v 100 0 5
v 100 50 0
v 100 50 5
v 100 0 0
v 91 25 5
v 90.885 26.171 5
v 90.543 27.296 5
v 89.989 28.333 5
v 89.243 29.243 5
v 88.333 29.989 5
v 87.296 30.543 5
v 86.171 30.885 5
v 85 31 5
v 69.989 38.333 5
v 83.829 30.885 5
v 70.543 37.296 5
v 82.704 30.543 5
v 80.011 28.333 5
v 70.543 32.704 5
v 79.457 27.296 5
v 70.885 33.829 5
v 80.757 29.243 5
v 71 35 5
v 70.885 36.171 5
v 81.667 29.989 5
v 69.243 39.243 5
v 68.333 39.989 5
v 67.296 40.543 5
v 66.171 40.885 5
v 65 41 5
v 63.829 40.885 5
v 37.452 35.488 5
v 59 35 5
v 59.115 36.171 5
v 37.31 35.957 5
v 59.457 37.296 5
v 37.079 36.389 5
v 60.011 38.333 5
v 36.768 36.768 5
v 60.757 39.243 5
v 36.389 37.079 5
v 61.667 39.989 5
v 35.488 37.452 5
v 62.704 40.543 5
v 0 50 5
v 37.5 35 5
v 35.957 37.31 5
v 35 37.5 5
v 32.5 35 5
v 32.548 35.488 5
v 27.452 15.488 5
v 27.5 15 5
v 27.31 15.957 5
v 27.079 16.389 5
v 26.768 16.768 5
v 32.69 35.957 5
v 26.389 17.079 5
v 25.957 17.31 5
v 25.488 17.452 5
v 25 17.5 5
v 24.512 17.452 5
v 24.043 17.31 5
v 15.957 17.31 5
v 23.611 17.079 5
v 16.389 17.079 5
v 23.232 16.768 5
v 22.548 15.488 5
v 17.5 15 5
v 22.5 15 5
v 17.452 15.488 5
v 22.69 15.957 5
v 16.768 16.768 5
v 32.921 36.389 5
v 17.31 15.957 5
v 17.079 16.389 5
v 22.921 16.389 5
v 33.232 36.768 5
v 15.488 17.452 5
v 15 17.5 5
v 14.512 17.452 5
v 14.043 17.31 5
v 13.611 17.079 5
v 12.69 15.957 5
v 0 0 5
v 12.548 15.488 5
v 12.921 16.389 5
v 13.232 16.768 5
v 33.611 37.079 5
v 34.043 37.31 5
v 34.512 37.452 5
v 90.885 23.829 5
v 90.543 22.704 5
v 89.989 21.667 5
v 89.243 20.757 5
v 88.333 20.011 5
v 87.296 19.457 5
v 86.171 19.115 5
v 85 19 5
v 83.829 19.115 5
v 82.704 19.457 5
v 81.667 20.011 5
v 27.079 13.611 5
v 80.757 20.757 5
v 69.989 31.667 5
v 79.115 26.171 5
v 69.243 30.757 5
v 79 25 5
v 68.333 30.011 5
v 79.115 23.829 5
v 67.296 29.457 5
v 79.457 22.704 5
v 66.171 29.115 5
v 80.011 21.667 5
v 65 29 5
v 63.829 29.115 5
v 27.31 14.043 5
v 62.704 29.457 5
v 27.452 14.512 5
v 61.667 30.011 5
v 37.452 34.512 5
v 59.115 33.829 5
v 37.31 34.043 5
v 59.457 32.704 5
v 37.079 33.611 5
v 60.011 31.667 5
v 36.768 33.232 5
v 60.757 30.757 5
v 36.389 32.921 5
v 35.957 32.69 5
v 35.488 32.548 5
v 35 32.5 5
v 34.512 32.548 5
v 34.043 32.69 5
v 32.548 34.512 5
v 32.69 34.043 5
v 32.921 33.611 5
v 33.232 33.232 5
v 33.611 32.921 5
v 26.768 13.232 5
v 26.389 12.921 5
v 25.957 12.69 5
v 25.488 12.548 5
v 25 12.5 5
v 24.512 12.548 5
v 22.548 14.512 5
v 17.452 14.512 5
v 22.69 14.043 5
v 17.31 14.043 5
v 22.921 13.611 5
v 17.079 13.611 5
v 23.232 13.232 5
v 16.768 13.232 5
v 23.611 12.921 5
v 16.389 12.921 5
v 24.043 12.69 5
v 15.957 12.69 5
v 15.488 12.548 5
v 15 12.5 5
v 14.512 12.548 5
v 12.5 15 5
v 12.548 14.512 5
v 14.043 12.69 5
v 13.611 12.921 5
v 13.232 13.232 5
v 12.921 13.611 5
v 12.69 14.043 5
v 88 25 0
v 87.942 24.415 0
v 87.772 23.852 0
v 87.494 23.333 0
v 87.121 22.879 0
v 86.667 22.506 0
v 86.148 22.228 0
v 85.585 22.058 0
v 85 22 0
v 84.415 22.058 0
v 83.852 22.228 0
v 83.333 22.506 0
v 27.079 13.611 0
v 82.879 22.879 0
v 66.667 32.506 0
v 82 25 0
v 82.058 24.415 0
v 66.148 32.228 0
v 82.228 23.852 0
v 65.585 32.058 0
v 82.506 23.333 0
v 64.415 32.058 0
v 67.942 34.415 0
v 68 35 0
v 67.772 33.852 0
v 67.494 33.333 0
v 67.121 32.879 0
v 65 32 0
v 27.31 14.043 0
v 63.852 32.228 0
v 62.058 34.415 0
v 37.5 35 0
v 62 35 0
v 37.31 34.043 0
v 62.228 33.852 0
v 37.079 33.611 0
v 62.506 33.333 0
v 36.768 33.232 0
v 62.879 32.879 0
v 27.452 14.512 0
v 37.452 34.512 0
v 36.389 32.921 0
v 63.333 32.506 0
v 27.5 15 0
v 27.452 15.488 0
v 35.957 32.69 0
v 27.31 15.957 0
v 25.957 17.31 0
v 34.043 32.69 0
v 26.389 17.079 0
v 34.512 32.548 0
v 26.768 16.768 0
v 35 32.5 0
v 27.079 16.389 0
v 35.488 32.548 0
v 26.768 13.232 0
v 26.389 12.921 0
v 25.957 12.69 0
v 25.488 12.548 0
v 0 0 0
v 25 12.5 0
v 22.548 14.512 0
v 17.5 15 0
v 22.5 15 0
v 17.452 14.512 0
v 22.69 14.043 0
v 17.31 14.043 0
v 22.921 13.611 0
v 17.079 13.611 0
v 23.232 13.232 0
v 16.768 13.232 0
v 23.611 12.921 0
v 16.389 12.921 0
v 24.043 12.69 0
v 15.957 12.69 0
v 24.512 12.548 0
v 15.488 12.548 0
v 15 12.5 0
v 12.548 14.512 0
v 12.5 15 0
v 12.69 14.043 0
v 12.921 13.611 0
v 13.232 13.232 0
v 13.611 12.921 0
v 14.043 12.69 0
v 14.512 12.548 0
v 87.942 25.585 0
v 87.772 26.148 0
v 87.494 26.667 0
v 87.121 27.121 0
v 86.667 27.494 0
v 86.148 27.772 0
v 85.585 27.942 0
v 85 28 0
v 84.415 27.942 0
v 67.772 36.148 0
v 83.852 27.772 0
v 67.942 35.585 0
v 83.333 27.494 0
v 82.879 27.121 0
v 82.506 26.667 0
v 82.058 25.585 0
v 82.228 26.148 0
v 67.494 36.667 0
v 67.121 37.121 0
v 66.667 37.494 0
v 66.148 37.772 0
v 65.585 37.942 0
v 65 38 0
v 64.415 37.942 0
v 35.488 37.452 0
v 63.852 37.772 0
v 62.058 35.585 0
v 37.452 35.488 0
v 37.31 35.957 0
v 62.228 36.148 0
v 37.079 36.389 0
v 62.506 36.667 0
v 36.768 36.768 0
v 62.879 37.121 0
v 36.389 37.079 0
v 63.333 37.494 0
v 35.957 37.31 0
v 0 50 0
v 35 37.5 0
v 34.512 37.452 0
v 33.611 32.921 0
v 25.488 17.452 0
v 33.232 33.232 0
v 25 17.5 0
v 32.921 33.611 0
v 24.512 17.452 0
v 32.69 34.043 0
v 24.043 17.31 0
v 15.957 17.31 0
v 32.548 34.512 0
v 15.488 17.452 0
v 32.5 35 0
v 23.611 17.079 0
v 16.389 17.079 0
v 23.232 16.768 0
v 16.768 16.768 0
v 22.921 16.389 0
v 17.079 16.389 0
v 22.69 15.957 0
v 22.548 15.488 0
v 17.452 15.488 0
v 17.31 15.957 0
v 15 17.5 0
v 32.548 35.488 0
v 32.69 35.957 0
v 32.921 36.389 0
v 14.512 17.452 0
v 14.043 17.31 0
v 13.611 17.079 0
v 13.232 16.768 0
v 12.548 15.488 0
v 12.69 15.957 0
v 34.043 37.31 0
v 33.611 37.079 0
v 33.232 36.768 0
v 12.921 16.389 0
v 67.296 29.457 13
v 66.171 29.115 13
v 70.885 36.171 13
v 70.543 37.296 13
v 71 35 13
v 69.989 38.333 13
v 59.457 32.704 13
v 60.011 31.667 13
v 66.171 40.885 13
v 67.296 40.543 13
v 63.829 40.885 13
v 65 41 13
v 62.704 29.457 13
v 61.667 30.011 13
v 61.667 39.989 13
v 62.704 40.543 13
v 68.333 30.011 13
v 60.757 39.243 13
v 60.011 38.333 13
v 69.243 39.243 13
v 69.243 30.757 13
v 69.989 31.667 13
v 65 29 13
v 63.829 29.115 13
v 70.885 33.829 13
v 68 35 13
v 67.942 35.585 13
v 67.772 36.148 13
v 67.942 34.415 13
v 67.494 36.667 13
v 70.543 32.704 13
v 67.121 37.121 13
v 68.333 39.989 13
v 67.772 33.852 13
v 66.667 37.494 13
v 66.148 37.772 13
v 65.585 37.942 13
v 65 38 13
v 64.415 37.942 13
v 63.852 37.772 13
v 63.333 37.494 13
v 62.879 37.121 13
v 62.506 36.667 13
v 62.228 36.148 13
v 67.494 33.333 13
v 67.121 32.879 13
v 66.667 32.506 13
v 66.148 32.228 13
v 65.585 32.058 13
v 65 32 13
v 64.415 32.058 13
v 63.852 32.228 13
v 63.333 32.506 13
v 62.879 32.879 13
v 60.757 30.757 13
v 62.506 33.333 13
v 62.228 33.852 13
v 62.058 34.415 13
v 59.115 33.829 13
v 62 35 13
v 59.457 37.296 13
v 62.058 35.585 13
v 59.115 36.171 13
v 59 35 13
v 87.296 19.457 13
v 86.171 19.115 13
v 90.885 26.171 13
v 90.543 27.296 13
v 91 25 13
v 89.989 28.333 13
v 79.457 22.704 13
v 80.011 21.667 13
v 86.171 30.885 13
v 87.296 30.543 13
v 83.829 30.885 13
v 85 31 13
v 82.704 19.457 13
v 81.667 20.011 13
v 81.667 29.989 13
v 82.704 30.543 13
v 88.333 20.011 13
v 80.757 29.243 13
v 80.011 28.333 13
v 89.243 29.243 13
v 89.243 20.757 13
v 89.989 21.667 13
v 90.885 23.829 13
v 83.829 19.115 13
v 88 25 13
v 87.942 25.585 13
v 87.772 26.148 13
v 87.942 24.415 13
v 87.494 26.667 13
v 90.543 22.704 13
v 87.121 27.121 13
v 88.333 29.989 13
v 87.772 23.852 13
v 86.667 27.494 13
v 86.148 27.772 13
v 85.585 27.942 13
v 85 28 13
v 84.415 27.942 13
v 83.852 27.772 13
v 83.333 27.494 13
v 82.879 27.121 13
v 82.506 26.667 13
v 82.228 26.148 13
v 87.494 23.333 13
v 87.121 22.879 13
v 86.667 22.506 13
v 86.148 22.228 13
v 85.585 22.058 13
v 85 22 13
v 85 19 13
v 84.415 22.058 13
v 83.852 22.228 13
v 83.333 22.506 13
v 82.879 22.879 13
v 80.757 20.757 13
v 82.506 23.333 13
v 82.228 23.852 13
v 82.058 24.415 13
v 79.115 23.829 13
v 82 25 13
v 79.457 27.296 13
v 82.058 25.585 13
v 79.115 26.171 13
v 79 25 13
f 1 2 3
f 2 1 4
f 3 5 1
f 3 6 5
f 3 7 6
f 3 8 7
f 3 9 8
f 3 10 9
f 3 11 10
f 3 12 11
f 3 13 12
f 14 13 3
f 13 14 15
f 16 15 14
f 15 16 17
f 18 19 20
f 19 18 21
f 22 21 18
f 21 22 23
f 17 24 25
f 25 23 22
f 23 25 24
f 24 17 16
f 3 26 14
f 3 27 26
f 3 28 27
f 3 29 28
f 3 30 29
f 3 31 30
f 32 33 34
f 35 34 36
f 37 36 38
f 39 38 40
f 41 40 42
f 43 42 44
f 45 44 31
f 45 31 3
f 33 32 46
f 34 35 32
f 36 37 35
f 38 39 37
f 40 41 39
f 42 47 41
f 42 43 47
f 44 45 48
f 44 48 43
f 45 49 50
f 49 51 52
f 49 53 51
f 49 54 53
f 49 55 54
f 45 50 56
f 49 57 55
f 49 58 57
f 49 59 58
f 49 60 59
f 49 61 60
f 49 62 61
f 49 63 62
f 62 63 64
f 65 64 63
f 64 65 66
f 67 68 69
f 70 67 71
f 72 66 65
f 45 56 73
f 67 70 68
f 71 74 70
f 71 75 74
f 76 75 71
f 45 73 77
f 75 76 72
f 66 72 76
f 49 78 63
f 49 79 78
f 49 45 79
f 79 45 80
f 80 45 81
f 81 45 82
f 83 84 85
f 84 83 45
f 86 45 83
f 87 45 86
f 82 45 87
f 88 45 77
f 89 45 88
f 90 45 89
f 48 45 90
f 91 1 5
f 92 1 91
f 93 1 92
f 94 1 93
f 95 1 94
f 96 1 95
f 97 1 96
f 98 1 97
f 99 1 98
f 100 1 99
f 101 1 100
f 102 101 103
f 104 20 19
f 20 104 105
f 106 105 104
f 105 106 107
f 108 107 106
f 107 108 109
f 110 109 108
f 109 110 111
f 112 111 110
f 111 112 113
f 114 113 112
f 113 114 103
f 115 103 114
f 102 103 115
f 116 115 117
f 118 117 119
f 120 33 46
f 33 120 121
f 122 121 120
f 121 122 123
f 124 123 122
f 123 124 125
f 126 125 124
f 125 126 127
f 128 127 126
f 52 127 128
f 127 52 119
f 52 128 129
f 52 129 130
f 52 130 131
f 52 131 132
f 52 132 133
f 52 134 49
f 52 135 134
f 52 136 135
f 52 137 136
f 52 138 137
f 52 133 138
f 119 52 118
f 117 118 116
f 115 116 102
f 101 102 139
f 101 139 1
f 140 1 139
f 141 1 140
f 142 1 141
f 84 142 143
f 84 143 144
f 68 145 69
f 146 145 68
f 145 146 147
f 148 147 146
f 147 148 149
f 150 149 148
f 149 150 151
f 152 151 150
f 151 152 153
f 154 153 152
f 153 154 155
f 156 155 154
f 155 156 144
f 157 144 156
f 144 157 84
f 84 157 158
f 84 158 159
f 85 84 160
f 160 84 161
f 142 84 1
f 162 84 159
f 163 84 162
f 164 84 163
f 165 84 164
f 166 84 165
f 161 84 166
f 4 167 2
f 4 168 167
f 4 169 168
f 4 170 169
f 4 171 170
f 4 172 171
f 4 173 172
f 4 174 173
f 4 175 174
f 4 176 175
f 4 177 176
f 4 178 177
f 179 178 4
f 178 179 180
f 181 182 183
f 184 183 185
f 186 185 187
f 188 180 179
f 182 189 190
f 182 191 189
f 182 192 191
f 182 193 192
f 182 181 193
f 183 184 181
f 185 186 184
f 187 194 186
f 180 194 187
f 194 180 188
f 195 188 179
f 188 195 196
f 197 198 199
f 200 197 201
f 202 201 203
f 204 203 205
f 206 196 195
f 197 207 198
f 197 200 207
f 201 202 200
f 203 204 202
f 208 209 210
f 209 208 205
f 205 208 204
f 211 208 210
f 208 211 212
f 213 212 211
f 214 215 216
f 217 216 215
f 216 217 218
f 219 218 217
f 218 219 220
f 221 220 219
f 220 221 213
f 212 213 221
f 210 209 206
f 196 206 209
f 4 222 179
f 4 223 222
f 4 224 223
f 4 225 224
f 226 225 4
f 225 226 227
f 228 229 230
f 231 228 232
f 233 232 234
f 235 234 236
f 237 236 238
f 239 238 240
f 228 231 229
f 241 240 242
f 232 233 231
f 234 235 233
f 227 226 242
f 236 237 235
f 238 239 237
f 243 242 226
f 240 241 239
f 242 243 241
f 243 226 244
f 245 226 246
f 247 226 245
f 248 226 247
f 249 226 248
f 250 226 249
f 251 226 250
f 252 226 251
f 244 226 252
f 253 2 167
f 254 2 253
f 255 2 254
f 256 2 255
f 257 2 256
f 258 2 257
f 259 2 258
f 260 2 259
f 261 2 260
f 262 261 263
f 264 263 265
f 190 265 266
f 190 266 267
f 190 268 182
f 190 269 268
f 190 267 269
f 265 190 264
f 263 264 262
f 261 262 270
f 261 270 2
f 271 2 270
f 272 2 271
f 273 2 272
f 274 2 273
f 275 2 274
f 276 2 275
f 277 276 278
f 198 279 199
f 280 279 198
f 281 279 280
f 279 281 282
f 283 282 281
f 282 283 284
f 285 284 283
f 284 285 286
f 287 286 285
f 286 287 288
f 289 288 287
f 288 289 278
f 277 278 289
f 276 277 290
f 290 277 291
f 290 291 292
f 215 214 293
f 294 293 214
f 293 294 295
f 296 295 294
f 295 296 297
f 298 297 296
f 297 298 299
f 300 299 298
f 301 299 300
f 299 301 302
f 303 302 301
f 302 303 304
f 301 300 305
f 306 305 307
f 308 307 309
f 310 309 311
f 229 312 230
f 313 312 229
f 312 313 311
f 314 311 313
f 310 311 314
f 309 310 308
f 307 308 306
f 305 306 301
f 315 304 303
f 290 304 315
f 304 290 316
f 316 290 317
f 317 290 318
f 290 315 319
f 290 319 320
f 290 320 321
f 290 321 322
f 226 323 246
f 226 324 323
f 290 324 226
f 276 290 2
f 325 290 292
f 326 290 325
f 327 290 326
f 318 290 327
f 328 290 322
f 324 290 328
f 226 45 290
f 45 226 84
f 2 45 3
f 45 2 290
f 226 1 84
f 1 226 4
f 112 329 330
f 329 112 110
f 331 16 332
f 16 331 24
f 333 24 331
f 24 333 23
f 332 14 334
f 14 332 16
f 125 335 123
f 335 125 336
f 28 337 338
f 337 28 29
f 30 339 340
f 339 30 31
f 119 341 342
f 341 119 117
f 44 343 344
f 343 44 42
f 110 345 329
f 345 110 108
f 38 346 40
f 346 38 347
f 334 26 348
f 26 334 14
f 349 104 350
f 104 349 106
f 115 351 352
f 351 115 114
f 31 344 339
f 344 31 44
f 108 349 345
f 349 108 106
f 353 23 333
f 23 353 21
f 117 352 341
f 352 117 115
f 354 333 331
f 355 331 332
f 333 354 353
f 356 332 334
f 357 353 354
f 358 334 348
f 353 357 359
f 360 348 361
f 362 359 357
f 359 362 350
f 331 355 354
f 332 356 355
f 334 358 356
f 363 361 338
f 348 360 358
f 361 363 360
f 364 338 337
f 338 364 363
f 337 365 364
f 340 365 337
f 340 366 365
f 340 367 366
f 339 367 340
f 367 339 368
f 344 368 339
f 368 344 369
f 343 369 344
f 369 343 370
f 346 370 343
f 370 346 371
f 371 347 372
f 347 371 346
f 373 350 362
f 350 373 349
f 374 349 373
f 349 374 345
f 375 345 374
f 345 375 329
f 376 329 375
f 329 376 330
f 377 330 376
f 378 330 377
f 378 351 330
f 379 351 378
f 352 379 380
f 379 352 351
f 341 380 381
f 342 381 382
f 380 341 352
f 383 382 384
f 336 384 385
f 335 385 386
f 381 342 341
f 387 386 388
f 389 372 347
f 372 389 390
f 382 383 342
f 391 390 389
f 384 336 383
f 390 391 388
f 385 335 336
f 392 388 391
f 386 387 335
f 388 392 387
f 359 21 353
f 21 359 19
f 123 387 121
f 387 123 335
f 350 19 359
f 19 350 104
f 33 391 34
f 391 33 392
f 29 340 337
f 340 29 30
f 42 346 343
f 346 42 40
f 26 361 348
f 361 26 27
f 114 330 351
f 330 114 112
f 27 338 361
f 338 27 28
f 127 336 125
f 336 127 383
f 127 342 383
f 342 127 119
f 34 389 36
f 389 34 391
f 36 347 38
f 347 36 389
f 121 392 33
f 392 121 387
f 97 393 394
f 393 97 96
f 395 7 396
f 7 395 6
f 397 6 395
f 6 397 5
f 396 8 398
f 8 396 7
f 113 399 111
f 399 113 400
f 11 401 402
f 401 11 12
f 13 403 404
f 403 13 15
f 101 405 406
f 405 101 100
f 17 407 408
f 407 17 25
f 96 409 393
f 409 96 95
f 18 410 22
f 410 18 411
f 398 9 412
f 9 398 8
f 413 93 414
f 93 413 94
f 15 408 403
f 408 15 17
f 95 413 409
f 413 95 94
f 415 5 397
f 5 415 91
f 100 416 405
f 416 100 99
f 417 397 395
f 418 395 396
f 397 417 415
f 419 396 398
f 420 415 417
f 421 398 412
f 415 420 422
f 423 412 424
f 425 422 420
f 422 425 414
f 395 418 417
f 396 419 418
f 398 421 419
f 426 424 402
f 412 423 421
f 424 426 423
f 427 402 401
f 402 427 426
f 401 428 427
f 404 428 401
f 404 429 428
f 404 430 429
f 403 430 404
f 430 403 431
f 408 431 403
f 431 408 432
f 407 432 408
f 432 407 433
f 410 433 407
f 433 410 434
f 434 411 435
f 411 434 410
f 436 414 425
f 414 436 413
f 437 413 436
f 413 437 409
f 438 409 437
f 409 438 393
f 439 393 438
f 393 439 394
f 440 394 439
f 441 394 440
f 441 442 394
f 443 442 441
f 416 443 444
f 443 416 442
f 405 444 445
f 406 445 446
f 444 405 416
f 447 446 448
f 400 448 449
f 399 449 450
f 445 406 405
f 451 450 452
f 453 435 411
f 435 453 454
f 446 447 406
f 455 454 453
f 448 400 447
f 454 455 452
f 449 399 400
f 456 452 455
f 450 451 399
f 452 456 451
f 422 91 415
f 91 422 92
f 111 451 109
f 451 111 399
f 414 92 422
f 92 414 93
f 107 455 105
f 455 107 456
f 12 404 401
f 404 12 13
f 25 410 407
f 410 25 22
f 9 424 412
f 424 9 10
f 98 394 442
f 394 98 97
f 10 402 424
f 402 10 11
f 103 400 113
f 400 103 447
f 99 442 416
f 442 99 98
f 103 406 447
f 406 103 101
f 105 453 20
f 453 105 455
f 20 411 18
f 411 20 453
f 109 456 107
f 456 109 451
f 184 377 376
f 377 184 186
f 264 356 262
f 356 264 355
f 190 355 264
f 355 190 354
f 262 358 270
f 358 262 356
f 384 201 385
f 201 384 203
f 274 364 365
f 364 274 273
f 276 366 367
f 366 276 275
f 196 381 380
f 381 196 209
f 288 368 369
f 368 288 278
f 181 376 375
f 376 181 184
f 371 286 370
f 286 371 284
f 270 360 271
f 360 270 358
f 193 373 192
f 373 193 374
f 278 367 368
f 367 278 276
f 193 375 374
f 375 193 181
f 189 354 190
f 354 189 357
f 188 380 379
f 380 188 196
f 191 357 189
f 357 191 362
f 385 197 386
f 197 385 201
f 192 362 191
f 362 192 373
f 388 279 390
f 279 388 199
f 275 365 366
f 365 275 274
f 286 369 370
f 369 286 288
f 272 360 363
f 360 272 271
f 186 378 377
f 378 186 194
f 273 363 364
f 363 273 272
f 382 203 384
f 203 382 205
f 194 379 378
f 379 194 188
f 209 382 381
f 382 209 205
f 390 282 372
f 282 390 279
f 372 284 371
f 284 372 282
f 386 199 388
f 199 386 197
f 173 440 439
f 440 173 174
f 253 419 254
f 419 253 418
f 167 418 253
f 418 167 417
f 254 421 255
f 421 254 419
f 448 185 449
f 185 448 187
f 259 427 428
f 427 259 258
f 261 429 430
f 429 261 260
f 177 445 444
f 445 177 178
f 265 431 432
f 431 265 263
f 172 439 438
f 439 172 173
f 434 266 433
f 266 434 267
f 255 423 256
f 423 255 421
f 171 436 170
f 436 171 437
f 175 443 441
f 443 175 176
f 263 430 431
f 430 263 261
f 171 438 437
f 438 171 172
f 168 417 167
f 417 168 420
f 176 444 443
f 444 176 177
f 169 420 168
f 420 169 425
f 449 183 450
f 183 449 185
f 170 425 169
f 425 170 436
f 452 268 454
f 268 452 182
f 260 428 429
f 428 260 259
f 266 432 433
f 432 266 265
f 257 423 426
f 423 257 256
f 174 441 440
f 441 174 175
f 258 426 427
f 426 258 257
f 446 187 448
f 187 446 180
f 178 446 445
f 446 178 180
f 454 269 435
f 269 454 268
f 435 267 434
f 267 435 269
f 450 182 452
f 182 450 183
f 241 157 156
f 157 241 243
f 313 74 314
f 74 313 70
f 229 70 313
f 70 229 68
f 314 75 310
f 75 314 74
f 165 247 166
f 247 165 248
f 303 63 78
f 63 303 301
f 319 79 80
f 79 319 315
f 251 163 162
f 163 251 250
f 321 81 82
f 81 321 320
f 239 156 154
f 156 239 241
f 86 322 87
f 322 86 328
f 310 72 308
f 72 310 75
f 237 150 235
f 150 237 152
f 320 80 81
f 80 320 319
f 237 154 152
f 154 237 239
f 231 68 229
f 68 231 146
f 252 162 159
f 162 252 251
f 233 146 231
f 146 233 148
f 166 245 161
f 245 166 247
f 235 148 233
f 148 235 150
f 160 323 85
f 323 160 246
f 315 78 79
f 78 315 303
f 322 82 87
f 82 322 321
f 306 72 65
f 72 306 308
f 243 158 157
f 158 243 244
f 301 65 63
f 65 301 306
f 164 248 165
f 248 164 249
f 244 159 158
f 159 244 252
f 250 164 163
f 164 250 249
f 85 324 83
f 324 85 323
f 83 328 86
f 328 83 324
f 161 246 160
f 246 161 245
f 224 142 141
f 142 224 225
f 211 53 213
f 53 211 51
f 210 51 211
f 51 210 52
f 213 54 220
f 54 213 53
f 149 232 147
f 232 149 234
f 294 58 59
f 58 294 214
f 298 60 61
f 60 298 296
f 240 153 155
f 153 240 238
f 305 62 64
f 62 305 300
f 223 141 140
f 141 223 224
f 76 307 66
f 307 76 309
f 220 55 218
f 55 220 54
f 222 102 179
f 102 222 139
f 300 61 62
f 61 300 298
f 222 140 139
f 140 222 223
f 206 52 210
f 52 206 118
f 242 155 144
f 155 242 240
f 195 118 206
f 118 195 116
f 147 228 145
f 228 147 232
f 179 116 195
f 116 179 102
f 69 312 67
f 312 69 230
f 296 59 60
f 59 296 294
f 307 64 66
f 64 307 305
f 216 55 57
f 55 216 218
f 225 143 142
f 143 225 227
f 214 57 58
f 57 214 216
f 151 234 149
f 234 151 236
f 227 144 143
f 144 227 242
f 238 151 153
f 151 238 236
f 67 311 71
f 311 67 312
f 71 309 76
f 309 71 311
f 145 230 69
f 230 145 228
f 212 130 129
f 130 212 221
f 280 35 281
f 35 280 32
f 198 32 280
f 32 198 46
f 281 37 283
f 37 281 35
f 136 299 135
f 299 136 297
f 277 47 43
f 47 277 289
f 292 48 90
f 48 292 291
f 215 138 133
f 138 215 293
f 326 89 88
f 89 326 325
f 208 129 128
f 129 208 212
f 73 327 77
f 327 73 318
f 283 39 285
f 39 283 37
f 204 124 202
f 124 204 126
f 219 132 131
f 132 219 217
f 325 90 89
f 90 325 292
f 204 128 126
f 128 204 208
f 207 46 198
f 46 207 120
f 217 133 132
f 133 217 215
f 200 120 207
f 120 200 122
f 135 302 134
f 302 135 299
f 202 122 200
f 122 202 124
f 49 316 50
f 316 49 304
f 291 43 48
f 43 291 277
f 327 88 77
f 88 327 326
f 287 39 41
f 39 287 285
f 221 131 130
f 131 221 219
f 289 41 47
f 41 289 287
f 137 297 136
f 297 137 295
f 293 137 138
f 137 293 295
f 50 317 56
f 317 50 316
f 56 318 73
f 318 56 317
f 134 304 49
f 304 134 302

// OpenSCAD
$fn = 32;

// ----------------------------------------------------------------------
// Mixed field: bosses and holes at given coordinates
// ----------------------------------------------------------------------

// --- parameters (mm) ---
plate_l = 100;            // plate length, X
plate_w = 50;             // plate width, Y
plate_t = 5;              // plate thickness, Z
boss_d = 12;              // boss diameter
boss_h = 8;               // boss height above the plate
hole_d = 5;               // through hole diameter
fit_tol = 0.1;            // tolerance for press fits, mm
free_tol = 0.5;           // tolerance for clearance fits, mm

total_h = plate_t + boss_h;  // overall height

difference() {
  union() {
    cube([plate_l, plate_w, plate_t]);
    translate([65, 35, plate_t]) cylinder(h = boss_h, d = boss_d);
    translate([85, 25, plate_t]) cylinder(h = boss_h, d = boss_d);
  }
  translate([65, 35, -1]) cylinder(h = total_h + 2, d = boss_d / 2);
  translate([85, 25, -1]) cylinder(h = total_h + 2, d = boss_d / 2);
  translate([15, 15, -1]) cylinder(h = plate_t + 2, d = hole_d);
  translate([25, 15, -1]) cylinder(h = plate_t + 2, d = hole_d);
  translate([35, 35, -1]) cylinder(h = plate_t + 2, d = hole_d);
}
